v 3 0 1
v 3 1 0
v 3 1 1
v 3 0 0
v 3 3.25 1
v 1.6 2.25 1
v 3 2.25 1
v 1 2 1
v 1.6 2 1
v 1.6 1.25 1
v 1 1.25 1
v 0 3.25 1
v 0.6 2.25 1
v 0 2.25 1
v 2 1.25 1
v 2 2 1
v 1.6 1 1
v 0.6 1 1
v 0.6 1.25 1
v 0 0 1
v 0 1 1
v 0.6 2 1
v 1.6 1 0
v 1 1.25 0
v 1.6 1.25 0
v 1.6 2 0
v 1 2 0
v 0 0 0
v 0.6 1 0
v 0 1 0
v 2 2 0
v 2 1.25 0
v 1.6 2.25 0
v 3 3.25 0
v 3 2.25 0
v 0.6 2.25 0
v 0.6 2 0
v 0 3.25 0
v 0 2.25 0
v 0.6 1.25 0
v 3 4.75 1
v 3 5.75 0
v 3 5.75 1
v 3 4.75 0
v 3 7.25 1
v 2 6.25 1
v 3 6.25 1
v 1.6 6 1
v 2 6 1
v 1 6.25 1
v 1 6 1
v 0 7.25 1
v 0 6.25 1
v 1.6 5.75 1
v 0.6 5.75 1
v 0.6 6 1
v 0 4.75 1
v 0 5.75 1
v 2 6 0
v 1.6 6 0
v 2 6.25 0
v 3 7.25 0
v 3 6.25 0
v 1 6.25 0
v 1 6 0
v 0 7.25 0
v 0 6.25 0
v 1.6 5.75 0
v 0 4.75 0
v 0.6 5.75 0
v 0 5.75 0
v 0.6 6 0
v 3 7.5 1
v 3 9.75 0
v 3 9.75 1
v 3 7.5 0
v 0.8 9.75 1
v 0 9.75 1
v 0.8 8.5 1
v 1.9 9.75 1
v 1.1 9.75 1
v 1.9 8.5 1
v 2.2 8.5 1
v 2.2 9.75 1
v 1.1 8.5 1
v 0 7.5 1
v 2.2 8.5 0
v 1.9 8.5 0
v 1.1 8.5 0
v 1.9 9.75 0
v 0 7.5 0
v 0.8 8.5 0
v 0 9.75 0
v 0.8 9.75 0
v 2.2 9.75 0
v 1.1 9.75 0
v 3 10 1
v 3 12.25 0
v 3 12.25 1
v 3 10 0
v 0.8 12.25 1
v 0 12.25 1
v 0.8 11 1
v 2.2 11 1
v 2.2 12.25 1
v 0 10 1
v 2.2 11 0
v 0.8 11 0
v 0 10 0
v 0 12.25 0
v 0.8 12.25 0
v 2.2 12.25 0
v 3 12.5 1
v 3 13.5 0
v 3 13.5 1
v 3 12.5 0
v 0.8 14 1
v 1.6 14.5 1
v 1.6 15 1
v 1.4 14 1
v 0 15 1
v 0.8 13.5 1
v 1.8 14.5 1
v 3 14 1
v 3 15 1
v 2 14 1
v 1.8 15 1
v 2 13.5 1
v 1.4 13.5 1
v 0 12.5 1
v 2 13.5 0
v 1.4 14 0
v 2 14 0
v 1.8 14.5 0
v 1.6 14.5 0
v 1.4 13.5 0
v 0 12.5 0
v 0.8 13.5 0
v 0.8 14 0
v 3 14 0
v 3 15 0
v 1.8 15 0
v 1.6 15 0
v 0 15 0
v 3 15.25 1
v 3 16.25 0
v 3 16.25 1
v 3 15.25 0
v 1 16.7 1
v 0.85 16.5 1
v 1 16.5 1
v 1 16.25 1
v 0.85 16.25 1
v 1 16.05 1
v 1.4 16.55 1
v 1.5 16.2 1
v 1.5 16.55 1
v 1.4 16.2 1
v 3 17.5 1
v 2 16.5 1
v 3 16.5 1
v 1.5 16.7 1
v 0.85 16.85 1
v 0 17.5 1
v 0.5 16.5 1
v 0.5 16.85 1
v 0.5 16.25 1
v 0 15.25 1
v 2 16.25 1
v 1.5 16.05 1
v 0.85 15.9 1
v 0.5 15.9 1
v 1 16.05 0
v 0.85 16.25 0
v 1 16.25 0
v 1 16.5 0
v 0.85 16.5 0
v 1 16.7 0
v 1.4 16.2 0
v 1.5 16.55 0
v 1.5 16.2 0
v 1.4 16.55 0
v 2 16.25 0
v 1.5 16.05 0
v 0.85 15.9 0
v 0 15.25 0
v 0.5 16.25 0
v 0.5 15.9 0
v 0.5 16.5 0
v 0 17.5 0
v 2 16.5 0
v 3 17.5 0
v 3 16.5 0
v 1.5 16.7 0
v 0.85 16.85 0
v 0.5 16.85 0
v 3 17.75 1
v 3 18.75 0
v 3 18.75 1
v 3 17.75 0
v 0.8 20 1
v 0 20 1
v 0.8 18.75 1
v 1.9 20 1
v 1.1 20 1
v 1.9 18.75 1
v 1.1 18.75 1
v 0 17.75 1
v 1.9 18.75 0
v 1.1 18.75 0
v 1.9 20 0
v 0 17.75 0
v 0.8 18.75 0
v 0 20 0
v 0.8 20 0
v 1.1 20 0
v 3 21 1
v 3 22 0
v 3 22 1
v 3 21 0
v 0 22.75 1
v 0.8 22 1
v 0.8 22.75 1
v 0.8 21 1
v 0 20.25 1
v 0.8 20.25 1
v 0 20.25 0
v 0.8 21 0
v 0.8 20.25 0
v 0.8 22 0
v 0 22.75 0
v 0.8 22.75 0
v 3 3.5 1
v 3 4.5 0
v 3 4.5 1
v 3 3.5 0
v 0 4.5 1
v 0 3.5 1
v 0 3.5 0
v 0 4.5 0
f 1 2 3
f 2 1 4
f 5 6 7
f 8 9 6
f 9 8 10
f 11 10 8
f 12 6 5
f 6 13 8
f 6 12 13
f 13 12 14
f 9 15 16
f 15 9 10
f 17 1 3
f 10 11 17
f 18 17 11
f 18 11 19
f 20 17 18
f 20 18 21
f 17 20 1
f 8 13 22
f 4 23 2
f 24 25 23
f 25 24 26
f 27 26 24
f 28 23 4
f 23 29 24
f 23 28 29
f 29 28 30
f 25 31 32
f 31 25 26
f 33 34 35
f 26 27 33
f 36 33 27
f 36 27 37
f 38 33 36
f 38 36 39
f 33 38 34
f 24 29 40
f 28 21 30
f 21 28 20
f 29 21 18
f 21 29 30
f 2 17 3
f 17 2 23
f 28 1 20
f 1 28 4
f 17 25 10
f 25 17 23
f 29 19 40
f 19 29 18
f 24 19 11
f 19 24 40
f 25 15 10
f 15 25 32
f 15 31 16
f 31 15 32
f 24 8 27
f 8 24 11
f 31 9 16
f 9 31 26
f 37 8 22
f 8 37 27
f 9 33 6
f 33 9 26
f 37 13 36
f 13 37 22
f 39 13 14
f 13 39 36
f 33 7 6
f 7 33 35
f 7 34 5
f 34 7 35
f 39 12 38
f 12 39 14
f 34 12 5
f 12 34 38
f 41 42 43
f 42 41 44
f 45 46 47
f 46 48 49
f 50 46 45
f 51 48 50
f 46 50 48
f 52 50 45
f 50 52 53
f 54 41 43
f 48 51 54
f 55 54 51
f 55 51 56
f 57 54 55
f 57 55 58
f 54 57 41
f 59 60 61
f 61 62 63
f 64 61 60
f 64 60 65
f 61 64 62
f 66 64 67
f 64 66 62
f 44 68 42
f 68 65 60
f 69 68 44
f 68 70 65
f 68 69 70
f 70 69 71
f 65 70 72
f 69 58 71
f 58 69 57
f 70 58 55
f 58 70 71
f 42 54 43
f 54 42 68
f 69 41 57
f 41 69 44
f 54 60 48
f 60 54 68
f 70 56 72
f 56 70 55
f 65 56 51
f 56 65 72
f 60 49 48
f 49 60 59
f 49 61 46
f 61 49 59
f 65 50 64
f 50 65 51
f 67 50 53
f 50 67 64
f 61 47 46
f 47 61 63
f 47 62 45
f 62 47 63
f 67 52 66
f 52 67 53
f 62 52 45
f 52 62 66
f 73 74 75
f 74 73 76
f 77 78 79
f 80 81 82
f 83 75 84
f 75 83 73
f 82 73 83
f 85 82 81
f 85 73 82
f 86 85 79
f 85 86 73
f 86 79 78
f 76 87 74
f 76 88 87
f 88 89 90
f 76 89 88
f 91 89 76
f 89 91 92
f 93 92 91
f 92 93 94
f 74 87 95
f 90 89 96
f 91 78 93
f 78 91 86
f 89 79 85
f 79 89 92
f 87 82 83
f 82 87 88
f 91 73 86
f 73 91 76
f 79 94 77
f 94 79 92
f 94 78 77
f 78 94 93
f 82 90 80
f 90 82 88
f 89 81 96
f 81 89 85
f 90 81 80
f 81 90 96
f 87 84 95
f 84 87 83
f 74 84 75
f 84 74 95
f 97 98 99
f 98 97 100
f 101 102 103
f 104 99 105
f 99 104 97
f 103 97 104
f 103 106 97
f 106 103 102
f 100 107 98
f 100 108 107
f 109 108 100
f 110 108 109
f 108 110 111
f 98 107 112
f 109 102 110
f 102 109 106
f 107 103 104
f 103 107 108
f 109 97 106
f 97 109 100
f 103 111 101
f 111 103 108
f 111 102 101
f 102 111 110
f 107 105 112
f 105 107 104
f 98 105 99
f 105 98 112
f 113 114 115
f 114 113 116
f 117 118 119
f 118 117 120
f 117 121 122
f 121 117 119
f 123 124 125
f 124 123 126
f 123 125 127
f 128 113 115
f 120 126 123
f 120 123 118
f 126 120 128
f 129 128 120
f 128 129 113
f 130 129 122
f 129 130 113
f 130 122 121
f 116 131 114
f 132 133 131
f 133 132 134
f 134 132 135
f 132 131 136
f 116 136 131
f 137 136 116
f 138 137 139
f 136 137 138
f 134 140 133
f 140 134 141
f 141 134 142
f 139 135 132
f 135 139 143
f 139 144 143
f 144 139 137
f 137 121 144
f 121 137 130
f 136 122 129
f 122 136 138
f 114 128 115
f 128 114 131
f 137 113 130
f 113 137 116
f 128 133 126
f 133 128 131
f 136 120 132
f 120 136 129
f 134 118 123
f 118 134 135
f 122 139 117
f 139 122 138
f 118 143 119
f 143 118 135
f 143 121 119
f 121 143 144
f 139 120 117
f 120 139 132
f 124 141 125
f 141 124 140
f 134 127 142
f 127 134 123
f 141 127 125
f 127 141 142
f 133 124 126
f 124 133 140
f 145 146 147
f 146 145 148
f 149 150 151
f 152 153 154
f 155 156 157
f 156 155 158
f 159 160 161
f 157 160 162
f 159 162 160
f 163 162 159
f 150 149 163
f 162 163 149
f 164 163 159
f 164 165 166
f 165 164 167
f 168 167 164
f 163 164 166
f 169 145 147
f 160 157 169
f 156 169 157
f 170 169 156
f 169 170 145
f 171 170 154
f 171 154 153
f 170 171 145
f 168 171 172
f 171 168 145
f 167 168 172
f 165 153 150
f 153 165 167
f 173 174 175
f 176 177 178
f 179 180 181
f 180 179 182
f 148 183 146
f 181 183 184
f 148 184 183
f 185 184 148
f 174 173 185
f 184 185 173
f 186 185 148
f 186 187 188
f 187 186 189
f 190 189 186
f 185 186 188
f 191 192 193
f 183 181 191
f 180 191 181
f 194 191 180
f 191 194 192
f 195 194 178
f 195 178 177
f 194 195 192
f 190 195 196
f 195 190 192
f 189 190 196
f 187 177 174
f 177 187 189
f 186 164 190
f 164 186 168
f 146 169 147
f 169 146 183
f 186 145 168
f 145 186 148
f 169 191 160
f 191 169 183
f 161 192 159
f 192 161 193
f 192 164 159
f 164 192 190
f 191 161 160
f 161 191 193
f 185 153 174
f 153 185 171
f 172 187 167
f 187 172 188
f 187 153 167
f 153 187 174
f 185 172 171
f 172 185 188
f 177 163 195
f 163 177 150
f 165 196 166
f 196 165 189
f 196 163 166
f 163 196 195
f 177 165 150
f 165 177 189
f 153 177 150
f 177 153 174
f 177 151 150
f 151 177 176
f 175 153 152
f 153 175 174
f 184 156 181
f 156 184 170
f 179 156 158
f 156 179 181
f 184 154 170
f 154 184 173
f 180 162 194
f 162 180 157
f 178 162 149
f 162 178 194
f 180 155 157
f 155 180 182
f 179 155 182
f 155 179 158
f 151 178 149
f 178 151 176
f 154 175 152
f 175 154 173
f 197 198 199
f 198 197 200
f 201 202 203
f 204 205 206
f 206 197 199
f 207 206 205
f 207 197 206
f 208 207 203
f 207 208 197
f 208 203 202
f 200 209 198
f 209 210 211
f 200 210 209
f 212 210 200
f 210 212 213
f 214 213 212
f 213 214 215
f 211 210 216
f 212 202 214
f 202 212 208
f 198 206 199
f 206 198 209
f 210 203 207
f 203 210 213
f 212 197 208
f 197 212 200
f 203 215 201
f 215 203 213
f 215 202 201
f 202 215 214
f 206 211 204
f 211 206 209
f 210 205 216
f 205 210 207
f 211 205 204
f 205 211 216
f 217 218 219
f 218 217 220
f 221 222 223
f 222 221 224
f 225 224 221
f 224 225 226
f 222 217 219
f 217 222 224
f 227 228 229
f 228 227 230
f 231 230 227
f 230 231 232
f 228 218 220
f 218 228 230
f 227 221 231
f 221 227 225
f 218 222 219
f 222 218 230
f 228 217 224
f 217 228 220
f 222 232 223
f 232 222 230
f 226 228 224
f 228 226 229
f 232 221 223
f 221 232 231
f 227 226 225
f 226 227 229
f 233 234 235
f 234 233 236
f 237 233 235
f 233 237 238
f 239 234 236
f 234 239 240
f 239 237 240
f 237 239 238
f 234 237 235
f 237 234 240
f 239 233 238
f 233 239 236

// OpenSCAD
module m(){ 
	cube([3,1,1]);

	translate([0.6,1,0])
		cube([1,0.25,1]);

	translate([1,1.25,0])
		cube([1,0.75,1]);

	translate([0.6,2,0])
		cube([1,0.25,1]);

	translate([0,2.25,0])
		cube([3,1,1]);
}

module i(){
	cube([3,1,1]);
}

module n() {
	cube([3,1,1]);
	
	translate([0.6,1,0])
		cube([1,0.25,1]);
	
	translate([1.0,1.25,0])
		cube([1,0.25,1]);
	
	translate([0,1.5,0])
		cube([3,1,1]);
}

module e() {
	cube([3,1,1]);
	
	cube([0.8,2.25,1]);

	translate([1.1,0,0])
	cube([0.8,2.25,1]);
	
	translate([2.2,0,0])
	cube([0.8,2.25,1]);
}

module c() {
	cube([3,1,1]);
	
	cube([0.8,2.25,1]);
	
	translate([2.2,0,0])
	cube([0.8,2.25,1]);
}


module r() {
	cube([3,1,1]);

	translate([1.4,1,0])
	cube([0.6,1,1]);
	
	cube([0.8,2.25,1]);
	
	translate([0,1.5,0])
	cube([1.6,1,1]);
	
	translate([1.8,1.5,0])
	cube([1.2,1,1]);
}

module a(){
	difference(){
		union(){
			cube([3,1,1]);
			
			cube([2,2,1]);

			translate([0,1.25,0])	
			cube([3,1,1]);
		}
		
		translate([0.5,0.65,0])
		  cube([0.35,0.35,1]);
		
		translate([0.5,1.25,0])
		  cube([0.35,0.35,1]);
		
		translate([0.85,1,0])
			cube([0.5,0.25,1]);
		
		translate([1.15,0.8,0])
			cube([0.35,0.15,1]);
		
		translate([1.15,1.3,0])
			cube([0.35,0.15,1]);
		
		translate([1,0.8,0])
			#cube([0.4,0.65,1]);
	}
}


module f(){
	cube([3,1,1]);
	
	cube([0.8,2.25,1]);

	translate([1.1,0,0])
		cube([0.8,2.25,1]);
}

module t(){
	translate([0,0.75,0])
	cube([3,1,1]);
	
	cube([0.8,2.5,1]);
}

module logo(){
	m();
	translate([0,3.5,0]) i();
	translate([0,4.75,0]) n();
	translate([0,7.5,0]) e();
	translate([0,10,0]) c();
	translate([0,12.5,0]) r();
	translate([0,15.25,0]) a();
	translate([0,17.75,0]) f();
	translate([0,20.25,0]) t();
}

logo();
